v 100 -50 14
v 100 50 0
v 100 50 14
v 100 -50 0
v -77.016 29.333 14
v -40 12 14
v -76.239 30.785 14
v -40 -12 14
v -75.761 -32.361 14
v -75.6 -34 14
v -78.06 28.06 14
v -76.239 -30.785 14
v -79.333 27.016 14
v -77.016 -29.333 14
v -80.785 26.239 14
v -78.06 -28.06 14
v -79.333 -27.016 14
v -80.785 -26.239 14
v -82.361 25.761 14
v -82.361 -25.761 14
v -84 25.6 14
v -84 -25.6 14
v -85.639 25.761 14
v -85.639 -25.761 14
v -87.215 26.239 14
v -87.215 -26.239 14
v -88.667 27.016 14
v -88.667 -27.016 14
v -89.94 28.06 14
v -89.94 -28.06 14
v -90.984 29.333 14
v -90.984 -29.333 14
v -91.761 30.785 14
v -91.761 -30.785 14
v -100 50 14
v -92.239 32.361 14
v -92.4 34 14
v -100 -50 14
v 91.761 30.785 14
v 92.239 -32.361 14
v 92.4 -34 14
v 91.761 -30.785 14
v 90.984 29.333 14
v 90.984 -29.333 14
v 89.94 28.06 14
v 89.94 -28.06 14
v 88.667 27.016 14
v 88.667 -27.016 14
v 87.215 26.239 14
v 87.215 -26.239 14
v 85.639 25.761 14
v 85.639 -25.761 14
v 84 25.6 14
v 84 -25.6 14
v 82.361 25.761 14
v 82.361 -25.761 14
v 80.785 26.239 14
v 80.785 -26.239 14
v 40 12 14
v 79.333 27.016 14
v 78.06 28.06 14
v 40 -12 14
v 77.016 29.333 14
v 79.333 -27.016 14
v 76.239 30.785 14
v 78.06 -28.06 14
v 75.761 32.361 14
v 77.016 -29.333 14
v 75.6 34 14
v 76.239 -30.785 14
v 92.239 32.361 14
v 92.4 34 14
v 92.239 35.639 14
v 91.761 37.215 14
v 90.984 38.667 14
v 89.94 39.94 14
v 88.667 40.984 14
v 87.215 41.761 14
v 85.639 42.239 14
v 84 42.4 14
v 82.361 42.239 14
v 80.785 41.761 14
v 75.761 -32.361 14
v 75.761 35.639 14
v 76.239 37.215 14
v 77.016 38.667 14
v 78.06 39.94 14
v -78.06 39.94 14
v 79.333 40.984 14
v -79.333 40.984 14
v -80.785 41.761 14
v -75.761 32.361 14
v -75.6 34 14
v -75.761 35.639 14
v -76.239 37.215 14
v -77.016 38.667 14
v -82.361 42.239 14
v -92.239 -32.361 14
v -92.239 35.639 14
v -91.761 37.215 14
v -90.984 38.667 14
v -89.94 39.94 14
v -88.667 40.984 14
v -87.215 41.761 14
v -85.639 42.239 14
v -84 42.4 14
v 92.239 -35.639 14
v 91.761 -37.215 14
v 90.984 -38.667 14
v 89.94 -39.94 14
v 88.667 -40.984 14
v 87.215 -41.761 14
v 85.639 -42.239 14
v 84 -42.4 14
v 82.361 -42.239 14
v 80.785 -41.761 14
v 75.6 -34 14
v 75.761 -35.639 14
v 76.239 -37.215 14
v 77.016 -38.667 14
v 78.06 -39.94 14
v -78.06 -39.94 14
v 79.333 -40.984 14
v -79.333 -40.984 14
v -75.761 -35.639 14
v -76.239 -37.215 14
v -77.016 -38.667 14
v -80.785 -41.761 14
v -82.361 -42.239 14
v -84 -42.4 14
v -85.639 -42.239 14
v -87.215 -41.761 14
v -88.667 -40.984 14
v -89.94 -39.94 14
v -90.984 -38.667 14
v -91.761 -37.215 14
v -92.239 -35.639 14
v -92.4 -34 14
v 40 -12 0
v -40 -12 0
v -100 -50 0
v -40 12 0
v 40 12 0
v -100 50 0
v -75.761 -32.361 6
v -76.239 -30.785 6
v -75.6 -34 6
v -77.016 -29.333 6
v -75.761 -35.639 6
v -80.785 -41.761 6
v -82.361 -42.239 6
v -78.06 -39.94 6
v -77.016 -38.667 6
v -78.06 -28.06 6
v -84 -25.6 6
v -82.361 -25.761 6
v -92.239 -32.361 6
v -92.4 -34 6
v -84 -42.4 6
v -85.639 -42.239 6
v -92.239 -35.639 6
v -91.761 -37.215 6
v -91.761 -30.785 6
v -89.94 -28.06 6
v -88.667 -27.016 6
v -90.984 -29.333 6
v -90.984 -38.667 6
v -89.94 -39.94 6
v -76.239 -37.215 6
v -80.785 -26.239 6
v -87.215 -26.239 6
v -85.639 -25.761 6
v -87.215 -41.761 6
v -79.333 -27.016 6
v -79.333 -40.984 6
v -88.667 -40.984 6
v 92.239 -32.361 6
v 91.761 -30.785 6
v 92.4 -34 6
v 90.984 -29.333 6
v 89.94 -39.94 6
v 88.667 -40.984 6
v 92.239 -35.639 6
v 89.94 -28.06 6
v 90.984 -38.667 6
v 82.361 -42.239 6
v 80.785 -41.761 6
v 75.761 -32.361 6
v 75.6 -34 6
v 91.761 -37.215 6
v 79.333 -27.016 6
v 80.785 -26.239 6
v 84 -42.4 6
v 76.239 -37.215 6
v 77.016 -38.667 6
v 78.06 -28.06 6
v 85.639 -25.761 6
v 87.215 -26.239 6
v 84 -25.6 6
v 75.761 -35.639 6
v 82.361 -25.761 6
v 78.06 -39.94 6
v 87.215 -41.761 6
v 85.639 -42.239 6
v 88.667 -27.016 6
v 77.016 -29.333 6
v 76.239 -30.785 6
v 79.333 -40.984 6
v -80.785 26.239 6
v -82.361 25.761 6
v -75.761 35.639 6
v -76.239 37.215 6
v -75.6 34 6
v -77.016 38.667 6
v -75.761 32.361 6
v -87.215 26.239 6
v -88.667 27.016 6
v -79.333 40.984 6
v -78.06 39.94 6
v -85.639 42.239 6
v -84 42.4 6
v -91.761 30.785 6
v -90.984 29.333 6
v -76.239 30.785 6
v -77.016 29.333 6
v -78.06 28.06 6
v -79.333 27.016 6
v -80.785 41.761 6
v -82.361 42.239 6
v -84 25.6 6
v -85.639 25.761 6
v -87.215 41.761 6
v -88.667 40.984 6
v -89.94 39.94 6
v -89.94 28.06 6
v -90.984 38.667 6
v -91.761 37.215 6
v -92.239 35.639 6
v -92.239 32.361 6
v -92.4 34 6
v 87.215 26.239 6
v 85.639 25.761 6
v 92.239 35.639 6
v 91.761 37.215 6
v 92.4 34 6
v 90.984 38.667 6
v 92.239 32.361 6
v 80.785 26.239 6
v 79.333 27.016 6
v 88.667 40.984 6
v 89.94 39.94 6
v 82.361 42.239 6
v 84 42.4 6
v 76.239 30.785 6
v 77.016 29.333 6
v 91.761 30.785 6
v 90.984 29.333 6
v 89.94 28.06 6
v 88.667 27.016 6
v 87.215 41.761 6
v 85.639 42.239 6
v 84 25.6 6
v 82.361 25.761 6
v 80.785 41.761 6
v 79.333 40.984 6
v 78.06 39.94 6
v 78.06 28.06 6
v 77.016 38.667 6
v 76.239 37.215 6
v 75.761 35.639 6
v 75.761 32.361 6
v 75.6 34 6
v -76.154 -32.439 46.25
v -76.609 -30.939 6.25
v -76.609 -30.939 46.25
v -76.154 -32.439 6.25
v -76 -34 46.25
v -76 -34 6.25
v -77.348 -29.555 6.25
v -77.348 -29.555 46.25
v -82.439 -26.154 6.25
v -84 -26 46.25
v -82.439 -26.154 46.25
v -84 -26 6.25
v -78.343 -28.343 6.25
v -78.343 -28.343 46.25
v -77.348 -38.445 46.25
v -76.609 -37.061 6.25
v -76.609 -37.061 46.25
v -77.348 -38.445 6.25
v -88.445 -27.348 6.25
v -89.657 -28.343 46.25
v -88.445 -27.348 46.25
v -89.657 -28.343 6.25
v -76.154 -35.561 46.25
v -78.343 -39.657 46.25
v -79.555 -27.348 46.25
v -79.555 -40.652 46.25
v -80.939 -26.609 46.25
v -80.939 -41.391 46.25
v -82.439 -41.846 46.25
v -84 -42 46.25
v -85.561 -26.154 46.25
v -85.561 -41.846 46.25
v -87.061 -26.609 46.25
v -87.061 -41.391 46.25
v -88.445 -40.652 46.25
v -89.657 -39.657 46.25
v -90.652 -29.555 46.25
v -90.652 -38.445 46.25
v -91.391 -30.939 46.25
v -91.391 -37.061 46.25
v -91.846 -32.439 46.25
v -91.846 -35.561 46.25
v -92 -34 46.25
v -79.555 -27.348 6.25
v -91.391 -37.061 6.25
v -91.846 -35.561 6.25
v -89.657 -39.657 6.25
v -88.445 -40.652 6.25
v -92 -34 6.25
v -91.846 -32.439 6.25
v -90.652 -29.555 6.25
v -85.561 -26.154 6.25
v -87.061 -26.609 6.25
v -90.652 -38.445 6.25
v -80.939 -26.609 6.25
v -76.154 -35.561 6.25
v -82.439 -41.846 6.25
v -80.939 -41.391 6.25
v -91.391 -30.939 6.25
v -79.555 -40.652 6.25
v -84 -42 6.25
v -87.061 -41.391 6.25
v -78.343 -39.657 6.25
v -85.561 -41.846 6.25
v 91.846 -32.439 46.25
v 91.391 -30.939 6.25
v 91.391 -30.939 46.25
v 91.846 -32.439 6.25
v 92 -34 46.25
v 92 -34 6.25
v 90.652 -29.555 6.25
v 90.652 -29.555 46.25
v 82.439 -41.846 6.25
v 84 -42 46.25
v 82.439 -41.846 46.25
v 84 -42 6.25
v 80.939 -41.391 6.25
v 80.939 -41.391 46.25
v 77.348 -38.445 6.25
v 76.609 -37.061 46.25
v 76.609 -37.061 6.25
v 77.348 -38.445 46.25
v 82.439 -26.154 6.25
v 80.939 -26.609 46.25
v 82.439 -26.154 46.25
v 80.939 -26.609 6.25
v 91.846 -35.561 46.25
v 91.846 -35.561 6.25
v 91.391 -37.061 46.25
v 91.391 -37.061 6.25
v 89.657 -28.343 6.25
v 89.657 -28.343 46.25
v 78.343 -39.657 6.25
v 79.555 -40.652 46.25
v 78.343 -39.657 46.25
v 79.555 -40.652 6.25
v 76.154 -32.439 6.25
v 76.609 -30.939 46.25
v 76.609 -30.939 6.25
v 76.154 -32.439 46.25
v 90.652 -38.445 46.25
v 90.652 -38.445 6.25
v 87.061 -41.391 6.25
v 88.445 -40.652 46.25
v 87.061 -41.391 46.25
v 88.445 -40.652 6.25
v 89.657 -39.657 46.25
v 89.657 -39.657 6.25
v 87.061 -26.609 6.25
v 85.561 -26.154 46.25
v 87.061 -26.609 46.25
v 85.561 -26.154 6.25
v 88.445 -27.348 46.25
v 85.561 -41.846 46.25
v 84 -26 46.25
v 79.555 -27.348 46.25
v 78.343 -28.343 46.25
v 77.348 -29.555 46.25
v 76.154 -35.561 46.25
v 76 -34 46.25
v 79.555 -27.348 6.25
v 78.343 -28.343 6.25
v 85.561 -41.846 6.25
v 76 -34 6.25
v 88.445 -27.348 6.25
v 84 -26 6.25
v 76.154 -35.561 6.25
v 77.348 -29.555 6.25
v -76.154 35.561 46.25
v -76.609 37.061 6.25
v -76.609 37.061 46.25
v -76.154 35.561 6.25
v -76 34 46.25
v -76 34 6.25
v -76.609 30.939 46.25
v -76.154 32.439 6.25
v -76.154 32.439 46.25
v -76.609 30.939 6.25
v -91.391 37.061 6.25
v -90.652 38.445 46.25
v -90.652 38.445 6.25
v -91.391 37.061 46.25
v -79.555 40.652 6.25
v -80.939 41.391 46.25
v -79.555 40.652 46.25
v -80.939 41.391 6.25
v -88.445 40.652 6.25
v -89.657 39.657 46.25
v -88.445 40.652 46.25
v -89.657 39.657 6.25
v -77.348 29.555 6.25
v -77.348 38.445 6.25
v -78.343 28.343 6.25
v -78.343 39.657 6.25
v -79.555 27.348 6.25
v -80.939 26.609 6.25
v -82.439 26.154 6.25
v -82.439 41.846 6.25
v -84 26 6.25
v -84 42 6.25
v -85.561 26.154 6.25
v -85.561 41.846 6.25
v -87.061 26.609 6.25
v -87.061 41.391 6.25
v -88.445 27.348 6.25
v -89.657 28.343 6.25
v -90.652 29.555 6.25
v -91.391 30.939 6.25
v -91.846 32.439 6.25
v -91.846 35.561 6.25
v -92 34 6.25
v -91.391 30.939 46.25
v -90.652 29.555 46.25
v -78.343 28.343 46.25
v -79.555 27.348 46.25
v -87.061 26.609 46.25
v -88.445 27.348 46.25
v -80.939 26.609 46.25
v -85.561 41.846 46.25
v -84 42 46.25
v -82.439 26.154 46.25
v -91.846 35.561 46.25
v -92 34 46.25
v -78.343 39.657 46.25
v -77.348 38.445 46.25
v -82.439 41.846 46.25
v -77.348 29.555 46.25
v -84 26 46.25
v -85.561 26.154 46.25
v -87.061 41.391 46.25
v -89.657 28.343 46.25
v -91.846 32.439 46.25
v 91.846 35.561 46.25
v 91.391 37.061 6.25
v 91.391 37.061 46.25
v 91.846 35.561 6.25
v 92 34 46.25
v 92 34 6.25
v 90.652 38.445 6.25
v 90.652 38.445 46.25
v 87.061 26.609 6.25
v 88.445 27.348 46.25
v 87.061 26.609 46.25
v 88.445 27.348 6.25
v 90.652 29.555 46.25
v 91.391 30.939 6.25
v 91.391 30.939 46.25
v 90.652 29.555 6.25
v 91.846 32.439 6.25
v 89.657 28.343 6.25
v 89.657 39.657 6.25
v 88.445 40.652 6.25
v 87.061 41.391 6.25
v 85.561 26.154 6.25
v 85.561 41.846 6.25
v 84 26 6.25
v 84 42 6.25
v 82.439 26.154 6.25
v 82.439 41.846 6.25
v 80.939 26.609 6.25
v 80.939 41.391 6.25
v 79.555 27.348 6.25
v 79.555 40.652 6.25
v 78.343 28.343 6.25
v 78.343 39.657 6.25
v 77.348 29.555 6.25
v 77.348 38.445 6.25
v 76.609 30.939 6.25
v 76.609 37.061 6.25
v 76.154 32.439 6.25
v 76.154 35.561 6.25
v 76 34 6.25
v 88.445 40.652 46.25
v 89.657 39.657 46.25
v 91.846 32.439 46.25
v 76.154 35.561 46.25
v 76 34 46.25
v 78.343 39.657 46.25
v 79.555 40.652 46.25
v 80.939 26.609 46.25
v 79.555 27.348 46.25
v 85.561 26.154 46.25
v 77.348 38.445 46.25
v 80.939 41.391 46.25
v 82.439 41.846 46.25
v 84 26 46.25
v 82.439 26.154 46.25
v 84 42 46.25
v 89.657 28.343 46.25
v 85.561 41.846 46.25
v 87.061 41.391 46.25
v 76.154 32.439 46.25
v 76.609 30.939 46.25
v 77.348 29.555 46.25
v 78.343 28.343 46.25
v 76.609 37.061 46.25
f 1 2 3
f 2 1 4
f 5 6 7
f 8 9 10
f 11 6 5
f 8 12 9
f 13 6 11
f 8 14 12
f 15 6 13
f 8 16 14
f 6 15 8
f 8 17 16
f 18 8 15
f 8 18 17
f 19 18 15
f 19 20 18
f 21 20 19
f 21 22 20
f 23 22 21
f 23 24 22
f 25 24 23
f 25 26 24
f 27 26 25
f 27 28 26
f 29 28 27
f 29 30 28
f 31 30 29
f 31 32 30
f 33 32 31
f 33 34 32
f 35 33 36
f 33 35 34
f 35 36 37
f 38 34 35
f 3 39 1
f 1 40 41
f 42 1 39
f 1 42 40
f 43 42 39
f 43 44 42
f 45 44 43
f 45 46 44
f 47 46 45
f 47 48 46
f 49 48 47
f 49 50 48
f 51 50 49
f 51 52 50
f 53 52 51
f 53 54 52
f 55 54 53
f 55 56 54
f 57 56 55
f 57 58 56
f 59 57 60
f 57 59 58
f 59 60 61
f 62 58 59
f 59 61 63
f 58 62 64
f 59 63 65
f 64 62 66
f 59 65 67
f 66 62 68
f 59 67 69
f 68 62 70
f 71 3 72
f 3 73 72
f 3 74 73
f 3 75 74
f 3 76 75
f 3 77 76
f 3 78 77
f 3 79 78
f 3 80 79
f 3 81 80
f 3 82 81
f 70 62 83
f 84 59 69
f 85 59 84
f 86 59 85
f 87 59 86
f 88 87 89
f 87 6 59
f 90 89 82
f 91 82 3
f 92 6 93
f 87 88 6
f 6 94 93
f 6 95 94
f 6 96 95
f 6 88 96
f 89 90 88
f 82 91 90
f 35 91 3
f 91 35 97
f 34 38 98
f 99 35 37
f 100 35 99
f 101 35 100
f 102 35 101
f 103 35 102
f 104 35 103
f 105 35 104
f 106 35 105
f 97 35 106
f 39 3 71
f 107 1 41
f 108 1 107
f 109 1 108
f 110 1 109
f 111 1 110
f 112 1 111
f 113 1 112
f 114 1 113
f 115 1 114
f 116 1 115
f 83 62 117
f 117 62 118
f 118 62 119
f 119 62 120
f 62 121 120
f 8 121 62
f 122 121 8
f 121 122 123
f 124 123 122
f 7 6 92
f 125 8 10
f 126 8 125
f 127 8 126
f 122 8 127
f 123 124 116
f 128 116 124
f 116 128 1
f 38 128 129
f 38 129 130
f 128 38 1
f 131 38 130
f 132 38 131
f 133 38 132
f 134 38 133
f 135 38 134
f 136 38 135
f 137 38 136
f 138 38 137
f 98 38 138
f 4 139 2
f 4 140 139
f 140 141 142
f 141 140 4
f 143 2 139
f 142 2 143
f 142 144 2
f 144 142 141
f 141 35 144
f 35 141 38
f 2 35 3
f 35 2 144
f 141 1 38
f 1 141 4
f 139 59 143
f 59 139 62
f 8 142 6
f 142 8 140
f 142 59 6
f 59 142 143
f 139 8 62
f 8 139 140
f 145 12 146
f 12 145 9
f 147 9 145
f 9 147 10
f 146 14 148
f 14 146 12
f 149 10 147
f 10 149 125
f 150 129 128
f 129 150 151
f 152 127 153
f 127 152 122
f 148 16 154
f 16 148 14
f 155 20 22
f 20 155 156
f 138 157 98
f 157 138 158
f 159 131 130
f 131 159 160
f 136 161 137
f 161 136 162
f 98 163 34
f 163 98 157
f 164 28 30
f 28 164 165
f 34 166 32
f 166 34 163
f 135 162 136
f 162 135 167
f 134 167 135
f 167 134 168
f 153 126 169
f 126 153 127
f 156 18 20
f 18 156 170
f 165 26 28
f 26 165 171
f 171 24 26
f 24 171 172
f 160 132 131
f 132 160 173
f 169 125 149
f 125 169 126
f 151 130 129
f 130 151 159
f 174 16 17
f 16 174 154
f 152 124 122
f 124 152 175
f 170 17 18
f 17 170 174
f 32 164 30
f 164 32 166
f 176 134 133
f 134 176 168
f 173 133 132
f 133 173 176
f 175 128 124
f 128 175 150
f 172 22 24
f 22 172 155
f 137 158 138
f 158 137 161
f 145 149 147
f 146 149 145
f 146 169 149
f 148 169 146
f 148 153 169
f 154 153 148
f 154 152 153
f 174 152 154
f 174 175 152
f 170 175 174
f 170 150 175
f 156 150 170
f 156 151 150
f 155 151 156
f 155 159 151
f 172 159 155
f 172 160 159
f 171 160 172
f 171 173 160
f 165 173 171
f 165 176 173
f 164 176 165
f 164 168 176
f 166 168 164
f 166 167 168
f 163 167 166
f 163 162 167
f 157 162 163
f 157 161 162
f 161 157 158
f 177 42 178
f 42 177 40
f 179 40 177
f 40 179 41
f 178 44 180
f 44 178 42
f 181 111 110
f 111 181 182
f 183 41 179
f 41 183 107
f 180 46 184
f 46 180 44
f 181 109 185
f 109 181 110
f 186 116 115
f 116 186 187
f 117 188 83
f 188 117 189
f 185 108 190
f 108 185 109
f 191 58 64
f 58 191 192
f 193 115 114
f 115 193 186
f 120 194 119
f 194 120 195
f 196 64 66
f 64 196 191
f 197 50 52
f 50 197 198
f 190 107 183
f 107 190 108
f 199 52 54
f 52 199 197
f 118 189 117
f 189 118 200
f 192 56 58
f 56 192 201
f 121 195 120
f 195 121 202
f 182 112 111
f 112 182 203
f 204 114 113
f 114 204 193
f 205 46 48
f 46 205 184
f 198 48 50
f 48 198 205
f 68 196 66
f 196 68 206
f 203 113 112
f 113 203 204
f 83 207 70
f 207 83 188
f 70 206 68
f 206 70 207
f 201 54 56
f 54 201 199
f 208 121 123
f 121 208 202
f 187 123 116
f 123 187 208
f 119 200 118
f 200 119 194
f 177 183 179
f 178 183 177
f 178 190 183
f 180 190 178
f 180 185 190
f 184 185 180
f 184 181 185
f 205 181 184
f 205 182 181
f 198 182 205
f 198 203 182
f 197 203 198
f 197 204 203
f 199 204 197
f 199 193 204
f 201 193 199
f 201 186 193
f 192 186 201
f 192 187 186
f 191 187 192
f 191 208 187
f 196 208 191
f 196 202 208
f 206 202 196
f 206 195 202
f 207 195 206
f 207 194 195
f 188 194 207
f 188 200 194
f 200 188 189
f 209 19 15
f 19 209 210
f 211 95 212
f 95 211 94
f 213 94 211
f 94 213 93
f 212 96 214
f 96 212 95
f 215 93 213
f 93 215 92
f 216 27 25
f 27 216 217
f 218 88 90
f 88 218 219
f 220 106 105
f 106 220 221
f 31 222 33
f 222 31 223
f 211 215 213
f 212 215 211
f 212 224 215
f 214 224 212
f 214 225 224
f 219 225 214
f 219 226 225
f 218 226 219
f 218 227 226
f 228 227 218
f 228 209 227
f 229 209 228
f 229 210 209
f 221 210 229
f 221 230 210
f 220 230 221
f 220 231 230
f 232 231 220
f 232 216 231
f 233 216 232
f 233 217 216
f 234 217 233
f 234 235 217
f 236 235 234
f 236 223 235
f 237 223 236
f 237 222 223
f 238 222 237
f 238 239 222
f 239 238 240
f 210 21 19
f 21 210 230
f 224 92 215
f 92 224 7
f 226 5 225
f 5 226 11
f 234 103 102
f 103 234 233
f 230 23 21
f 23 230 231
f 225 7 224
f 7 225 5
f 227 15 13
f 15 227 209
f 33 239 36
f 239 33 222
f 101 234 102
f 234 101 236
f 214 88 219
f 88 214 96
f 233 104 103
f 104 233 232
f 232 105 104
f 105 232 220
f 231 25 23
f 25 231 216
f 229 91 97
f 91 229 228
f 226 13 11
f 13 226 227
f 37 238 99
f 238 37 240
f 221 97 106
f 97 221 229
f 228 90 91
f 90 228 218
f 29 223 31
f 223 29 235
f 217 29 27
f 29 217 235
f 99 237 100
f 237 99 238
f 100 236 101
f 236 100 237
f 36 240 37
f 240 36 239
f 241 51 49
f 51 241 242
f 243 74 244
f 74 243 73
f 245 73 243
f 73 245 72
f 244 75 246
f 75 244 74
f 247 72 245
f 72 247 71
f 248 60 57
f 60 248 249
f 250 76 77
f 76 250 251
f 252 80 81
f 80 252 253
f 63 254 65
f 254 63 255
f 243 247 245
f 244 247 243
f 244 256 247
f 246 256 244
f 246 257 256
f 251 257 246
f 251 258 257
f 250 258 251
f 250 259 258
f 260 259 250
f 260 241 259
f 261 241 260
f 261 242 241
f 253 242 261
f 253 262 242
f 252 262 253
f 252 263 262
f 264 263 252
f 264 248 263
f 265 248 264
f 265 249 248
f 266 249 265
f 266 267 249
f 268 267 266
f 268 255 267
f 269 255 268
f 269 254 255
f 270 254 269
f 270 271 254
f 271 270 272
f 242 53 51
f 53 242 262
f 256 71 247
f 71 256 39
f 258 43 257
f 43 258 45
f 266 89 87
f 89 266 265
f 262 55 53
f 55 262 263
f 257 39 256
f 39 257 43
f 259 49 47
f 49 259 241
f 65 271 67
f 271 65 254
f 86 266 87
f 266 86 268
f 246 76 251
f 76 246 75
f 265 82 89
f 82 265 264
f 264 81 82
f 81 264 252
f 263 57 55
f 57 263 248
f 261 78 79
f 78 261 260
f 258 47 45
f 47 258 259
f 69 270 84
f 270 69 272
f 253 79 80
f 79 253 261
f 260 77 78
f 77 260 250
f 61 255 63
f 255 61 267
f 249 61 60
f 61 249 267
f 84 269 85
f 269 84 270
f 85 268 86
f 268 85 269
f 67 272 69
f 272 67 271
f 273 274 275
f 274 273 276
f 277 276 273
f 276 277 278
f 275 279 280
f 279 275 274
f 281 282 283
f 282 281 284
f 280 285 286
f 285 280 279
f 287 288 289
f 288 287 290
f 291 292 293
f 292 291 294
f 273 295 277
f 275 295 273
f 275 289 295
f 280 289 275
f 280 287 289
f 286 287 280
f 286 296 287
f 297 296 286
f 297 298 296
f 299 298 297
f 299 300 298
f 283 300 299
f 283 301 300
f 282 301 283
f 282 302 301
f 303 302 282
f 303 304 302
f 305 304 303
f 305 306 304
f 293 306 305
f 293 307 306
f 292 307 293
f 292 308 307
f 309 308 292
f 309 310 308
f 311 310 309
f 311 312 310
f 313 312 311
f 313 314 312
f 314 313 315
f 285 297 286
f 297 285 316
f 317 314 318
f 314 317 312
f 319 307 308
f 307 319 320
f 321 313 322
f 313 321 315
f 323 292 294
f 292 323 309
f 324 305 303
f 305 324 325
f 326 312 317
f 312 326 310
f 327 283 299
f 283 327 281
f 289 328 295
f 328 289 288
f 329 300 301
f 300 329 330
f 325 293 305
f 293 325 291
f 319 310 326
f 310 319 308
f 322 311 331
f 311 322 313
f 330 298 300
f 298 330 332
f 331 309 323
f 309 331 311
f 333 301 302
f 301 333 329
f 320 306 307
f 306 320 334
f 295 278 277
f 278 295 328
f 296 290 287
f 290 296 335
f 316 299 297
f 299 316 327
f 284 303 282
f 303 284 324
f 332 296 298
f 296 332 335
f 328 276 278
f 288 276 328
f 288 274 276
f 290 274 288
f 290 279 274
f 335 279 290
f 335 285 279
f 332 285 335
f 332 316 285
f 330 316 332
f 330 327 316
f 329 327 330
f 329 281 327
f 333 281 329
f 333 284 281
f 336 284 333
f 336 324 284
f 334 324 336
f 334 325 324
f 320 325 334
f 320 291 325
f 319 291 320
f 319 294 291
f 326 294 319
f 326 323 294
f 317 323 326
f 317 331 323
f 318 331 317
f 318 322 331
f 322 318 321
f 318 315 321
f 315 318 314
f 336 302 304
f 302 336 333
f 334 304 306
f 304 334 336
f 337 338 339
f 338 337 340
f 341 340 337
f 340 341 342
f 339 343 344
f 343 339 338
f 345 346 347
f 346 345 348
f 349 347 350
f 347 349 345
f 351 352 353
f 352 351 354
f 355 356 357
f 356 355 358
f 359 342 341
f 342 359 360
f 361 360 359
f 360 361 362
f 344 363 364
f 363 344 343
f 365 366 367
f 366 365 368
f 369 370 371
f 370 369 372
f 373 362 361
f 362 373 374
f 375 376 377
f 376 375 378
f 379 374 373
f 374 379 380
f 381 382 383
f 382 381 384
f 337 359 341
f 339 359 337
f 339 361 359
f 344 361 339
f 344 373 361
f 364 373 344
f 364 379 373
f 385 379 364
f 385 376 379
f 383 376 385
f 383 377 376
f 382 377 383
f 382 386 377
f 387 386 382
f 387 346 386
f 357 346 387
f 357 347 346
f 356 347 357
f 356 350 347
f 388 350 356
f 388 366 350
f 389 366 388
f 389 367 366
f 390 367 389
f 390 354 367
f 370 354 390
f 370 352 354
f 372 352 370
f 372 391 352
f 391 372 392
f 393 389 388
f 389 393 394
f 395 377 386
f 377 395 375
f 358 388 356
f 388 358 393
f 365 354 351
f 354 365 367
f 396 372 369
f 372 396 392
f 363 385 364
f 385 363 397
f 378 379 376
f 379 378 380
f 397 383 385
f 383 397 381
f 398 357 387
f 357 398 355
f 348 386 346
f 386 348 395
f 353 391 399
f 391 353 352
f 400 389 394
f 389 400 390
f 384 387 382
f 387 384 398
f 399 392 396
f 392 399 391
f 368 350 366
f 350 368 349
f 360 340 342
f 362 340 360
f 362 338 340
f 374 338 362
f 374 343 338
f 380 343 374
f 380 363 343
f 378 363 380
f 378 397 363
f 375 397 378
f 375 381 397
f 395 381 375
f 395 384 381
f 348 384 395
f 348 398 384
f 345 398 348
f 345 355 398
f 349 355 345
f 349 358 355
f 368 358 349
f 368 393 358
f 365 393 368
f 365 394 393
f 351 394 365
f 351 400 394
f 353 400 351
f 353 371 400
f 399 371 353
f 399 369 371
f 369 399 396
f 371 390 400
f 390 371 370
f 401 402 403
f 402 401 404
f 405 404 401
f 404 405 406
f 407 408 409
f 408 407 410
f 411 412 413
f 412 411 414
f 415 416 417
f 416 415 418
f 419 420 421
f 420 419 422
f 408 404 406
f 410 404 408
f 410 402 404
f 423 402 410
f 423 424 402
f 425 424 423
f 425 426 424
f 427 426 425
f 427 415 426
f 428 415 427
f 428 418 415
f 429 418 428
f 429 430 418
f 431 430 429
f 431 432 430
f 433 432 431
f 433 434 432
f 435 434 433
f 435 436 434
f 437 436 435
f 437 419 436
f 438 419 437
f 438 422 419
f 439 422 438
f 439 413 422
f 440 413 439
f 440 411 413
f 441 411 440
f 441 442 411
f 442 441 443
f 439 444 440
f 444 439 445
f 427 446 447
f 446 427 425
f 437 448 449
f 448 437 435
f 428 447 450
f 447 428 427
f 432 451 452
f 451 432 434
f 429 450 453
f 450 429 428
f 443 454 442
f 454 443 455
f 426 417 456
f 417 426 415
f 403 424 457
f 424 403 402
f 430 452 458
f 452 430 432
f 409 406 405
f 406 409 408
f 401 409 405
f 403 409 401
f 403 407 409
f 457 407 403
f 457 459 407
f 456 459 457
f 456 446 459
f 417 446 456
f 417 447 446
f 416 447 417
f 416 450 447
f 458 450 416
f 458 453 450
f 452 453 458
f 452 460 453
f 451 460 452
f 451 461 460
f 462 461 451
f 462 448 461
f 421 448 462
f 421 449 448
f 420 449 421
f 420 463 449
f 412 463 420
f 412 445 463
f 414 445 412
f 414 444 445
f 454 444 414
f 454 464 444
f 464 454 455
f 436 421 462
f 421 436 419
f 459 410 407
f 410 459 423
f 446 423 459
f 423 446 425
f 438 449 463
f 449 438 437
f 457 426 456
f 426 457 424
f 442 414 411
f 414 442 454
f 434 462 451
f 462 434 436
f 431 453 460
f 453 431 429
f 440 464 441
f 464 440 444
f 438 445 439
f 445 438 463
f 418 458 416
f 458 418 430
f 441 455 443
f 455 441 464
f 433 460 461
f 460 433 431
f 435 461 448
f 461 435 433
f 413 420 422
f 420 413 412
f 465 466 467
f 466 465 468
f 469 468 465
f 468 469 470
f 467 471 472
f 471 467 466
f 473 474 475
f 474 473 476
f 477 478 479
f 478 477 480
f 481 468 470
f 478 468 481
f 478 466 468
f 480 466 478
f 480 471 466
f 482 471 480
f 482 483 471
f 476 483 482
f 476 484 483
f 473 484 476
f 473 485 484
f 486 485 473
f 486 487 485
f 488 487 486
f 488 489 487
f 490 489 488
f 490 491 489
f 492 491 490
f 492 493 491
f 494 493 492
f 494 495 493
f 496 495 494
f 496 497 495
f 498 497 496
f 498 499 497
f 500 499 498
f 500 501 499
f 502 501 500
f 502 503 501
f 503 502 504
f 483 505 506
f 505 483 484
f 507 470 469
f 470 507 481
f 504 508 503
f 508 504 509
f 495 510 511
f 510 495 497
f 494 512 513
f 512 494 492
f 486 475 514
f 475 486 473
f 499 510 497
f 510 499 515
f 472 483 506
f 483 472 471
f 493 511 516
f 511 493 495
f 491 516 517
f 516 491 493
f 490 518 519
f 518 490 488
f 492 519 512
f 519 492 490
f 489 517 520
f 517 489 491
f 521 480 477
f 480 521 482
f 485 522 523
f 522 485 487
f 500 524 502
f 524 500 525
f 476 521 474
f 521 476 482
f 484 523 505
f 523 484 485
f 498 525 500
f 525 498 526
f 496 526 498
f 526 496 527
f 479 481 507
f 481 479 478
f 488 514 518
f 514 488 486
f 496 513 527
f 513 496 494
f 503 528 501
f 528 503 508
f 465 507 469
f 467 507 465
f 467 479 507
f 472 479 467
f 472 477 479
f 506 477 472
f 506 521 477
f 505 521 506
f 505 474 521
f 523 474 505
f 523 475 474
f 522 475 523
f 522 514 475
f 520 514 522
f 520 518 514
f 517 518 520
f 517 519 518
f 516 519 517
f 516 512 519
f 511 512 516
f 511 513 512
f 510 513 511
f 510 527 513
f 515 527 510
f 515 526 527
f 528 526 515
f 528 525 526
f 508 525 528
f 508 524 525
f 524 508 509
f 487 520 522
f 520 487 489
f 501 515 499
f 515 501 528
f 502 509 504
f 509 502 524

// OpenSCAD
$fn = 32;

// ------------------------------------------------------------------------
// Frame with four posts: 200 x 100 mm frame, four d16 posts
// Every part is its own module, assembly() places them once.
// ------------------------------------------------------------------------

// --- part 1 ---
module base_frame() {
  difference() {
    translate([-100, -50, 0]) cube([200, 100, 14]);
    translate([-40, -12, -1]) cube([80, 24, 16]);
    translate([-84, -34, 6]) cylinder(h = 9, d = 16.8);
    translate([84, -34, 6]) cylinder(h = 9, d = 16.8);
    translate([-84, 34, 6]) cylinder(h = 9, d = 16.8);
    translate([84, 34, 6]) cylinder(h = 9, d = 16.8);
  }
}

// --- part 2 ---
module post1() {
  cylinder(h = 40, d = 16);
}

// --- part 3 ---
module post2() {
  cylinder(h = 40, d = 16);
}

// --- part 4 ---
module post3() {
  cylinder(h = 40, d = 16);
}

// --- part 5 ---
module post4() {
  cylinder(h = 40, d = 16);
}

// --- assembly ---
module assembly() {
  translate([0, 0, 0]) rotate([0, 0, 0]) base_frame();
  translate([-84, -34, 6.25]) rotate([0, 0, 0]) post1();
  translate([84, -34, 6.25]) rotate([0, 0, 0]) post2();
  translate([-84, 34, 6.25]) rotate([0, 0, 0]) post3();
  translate([84, 34, 6.25]) rotate([0, 0, 0]) post4();
}

assembly();
